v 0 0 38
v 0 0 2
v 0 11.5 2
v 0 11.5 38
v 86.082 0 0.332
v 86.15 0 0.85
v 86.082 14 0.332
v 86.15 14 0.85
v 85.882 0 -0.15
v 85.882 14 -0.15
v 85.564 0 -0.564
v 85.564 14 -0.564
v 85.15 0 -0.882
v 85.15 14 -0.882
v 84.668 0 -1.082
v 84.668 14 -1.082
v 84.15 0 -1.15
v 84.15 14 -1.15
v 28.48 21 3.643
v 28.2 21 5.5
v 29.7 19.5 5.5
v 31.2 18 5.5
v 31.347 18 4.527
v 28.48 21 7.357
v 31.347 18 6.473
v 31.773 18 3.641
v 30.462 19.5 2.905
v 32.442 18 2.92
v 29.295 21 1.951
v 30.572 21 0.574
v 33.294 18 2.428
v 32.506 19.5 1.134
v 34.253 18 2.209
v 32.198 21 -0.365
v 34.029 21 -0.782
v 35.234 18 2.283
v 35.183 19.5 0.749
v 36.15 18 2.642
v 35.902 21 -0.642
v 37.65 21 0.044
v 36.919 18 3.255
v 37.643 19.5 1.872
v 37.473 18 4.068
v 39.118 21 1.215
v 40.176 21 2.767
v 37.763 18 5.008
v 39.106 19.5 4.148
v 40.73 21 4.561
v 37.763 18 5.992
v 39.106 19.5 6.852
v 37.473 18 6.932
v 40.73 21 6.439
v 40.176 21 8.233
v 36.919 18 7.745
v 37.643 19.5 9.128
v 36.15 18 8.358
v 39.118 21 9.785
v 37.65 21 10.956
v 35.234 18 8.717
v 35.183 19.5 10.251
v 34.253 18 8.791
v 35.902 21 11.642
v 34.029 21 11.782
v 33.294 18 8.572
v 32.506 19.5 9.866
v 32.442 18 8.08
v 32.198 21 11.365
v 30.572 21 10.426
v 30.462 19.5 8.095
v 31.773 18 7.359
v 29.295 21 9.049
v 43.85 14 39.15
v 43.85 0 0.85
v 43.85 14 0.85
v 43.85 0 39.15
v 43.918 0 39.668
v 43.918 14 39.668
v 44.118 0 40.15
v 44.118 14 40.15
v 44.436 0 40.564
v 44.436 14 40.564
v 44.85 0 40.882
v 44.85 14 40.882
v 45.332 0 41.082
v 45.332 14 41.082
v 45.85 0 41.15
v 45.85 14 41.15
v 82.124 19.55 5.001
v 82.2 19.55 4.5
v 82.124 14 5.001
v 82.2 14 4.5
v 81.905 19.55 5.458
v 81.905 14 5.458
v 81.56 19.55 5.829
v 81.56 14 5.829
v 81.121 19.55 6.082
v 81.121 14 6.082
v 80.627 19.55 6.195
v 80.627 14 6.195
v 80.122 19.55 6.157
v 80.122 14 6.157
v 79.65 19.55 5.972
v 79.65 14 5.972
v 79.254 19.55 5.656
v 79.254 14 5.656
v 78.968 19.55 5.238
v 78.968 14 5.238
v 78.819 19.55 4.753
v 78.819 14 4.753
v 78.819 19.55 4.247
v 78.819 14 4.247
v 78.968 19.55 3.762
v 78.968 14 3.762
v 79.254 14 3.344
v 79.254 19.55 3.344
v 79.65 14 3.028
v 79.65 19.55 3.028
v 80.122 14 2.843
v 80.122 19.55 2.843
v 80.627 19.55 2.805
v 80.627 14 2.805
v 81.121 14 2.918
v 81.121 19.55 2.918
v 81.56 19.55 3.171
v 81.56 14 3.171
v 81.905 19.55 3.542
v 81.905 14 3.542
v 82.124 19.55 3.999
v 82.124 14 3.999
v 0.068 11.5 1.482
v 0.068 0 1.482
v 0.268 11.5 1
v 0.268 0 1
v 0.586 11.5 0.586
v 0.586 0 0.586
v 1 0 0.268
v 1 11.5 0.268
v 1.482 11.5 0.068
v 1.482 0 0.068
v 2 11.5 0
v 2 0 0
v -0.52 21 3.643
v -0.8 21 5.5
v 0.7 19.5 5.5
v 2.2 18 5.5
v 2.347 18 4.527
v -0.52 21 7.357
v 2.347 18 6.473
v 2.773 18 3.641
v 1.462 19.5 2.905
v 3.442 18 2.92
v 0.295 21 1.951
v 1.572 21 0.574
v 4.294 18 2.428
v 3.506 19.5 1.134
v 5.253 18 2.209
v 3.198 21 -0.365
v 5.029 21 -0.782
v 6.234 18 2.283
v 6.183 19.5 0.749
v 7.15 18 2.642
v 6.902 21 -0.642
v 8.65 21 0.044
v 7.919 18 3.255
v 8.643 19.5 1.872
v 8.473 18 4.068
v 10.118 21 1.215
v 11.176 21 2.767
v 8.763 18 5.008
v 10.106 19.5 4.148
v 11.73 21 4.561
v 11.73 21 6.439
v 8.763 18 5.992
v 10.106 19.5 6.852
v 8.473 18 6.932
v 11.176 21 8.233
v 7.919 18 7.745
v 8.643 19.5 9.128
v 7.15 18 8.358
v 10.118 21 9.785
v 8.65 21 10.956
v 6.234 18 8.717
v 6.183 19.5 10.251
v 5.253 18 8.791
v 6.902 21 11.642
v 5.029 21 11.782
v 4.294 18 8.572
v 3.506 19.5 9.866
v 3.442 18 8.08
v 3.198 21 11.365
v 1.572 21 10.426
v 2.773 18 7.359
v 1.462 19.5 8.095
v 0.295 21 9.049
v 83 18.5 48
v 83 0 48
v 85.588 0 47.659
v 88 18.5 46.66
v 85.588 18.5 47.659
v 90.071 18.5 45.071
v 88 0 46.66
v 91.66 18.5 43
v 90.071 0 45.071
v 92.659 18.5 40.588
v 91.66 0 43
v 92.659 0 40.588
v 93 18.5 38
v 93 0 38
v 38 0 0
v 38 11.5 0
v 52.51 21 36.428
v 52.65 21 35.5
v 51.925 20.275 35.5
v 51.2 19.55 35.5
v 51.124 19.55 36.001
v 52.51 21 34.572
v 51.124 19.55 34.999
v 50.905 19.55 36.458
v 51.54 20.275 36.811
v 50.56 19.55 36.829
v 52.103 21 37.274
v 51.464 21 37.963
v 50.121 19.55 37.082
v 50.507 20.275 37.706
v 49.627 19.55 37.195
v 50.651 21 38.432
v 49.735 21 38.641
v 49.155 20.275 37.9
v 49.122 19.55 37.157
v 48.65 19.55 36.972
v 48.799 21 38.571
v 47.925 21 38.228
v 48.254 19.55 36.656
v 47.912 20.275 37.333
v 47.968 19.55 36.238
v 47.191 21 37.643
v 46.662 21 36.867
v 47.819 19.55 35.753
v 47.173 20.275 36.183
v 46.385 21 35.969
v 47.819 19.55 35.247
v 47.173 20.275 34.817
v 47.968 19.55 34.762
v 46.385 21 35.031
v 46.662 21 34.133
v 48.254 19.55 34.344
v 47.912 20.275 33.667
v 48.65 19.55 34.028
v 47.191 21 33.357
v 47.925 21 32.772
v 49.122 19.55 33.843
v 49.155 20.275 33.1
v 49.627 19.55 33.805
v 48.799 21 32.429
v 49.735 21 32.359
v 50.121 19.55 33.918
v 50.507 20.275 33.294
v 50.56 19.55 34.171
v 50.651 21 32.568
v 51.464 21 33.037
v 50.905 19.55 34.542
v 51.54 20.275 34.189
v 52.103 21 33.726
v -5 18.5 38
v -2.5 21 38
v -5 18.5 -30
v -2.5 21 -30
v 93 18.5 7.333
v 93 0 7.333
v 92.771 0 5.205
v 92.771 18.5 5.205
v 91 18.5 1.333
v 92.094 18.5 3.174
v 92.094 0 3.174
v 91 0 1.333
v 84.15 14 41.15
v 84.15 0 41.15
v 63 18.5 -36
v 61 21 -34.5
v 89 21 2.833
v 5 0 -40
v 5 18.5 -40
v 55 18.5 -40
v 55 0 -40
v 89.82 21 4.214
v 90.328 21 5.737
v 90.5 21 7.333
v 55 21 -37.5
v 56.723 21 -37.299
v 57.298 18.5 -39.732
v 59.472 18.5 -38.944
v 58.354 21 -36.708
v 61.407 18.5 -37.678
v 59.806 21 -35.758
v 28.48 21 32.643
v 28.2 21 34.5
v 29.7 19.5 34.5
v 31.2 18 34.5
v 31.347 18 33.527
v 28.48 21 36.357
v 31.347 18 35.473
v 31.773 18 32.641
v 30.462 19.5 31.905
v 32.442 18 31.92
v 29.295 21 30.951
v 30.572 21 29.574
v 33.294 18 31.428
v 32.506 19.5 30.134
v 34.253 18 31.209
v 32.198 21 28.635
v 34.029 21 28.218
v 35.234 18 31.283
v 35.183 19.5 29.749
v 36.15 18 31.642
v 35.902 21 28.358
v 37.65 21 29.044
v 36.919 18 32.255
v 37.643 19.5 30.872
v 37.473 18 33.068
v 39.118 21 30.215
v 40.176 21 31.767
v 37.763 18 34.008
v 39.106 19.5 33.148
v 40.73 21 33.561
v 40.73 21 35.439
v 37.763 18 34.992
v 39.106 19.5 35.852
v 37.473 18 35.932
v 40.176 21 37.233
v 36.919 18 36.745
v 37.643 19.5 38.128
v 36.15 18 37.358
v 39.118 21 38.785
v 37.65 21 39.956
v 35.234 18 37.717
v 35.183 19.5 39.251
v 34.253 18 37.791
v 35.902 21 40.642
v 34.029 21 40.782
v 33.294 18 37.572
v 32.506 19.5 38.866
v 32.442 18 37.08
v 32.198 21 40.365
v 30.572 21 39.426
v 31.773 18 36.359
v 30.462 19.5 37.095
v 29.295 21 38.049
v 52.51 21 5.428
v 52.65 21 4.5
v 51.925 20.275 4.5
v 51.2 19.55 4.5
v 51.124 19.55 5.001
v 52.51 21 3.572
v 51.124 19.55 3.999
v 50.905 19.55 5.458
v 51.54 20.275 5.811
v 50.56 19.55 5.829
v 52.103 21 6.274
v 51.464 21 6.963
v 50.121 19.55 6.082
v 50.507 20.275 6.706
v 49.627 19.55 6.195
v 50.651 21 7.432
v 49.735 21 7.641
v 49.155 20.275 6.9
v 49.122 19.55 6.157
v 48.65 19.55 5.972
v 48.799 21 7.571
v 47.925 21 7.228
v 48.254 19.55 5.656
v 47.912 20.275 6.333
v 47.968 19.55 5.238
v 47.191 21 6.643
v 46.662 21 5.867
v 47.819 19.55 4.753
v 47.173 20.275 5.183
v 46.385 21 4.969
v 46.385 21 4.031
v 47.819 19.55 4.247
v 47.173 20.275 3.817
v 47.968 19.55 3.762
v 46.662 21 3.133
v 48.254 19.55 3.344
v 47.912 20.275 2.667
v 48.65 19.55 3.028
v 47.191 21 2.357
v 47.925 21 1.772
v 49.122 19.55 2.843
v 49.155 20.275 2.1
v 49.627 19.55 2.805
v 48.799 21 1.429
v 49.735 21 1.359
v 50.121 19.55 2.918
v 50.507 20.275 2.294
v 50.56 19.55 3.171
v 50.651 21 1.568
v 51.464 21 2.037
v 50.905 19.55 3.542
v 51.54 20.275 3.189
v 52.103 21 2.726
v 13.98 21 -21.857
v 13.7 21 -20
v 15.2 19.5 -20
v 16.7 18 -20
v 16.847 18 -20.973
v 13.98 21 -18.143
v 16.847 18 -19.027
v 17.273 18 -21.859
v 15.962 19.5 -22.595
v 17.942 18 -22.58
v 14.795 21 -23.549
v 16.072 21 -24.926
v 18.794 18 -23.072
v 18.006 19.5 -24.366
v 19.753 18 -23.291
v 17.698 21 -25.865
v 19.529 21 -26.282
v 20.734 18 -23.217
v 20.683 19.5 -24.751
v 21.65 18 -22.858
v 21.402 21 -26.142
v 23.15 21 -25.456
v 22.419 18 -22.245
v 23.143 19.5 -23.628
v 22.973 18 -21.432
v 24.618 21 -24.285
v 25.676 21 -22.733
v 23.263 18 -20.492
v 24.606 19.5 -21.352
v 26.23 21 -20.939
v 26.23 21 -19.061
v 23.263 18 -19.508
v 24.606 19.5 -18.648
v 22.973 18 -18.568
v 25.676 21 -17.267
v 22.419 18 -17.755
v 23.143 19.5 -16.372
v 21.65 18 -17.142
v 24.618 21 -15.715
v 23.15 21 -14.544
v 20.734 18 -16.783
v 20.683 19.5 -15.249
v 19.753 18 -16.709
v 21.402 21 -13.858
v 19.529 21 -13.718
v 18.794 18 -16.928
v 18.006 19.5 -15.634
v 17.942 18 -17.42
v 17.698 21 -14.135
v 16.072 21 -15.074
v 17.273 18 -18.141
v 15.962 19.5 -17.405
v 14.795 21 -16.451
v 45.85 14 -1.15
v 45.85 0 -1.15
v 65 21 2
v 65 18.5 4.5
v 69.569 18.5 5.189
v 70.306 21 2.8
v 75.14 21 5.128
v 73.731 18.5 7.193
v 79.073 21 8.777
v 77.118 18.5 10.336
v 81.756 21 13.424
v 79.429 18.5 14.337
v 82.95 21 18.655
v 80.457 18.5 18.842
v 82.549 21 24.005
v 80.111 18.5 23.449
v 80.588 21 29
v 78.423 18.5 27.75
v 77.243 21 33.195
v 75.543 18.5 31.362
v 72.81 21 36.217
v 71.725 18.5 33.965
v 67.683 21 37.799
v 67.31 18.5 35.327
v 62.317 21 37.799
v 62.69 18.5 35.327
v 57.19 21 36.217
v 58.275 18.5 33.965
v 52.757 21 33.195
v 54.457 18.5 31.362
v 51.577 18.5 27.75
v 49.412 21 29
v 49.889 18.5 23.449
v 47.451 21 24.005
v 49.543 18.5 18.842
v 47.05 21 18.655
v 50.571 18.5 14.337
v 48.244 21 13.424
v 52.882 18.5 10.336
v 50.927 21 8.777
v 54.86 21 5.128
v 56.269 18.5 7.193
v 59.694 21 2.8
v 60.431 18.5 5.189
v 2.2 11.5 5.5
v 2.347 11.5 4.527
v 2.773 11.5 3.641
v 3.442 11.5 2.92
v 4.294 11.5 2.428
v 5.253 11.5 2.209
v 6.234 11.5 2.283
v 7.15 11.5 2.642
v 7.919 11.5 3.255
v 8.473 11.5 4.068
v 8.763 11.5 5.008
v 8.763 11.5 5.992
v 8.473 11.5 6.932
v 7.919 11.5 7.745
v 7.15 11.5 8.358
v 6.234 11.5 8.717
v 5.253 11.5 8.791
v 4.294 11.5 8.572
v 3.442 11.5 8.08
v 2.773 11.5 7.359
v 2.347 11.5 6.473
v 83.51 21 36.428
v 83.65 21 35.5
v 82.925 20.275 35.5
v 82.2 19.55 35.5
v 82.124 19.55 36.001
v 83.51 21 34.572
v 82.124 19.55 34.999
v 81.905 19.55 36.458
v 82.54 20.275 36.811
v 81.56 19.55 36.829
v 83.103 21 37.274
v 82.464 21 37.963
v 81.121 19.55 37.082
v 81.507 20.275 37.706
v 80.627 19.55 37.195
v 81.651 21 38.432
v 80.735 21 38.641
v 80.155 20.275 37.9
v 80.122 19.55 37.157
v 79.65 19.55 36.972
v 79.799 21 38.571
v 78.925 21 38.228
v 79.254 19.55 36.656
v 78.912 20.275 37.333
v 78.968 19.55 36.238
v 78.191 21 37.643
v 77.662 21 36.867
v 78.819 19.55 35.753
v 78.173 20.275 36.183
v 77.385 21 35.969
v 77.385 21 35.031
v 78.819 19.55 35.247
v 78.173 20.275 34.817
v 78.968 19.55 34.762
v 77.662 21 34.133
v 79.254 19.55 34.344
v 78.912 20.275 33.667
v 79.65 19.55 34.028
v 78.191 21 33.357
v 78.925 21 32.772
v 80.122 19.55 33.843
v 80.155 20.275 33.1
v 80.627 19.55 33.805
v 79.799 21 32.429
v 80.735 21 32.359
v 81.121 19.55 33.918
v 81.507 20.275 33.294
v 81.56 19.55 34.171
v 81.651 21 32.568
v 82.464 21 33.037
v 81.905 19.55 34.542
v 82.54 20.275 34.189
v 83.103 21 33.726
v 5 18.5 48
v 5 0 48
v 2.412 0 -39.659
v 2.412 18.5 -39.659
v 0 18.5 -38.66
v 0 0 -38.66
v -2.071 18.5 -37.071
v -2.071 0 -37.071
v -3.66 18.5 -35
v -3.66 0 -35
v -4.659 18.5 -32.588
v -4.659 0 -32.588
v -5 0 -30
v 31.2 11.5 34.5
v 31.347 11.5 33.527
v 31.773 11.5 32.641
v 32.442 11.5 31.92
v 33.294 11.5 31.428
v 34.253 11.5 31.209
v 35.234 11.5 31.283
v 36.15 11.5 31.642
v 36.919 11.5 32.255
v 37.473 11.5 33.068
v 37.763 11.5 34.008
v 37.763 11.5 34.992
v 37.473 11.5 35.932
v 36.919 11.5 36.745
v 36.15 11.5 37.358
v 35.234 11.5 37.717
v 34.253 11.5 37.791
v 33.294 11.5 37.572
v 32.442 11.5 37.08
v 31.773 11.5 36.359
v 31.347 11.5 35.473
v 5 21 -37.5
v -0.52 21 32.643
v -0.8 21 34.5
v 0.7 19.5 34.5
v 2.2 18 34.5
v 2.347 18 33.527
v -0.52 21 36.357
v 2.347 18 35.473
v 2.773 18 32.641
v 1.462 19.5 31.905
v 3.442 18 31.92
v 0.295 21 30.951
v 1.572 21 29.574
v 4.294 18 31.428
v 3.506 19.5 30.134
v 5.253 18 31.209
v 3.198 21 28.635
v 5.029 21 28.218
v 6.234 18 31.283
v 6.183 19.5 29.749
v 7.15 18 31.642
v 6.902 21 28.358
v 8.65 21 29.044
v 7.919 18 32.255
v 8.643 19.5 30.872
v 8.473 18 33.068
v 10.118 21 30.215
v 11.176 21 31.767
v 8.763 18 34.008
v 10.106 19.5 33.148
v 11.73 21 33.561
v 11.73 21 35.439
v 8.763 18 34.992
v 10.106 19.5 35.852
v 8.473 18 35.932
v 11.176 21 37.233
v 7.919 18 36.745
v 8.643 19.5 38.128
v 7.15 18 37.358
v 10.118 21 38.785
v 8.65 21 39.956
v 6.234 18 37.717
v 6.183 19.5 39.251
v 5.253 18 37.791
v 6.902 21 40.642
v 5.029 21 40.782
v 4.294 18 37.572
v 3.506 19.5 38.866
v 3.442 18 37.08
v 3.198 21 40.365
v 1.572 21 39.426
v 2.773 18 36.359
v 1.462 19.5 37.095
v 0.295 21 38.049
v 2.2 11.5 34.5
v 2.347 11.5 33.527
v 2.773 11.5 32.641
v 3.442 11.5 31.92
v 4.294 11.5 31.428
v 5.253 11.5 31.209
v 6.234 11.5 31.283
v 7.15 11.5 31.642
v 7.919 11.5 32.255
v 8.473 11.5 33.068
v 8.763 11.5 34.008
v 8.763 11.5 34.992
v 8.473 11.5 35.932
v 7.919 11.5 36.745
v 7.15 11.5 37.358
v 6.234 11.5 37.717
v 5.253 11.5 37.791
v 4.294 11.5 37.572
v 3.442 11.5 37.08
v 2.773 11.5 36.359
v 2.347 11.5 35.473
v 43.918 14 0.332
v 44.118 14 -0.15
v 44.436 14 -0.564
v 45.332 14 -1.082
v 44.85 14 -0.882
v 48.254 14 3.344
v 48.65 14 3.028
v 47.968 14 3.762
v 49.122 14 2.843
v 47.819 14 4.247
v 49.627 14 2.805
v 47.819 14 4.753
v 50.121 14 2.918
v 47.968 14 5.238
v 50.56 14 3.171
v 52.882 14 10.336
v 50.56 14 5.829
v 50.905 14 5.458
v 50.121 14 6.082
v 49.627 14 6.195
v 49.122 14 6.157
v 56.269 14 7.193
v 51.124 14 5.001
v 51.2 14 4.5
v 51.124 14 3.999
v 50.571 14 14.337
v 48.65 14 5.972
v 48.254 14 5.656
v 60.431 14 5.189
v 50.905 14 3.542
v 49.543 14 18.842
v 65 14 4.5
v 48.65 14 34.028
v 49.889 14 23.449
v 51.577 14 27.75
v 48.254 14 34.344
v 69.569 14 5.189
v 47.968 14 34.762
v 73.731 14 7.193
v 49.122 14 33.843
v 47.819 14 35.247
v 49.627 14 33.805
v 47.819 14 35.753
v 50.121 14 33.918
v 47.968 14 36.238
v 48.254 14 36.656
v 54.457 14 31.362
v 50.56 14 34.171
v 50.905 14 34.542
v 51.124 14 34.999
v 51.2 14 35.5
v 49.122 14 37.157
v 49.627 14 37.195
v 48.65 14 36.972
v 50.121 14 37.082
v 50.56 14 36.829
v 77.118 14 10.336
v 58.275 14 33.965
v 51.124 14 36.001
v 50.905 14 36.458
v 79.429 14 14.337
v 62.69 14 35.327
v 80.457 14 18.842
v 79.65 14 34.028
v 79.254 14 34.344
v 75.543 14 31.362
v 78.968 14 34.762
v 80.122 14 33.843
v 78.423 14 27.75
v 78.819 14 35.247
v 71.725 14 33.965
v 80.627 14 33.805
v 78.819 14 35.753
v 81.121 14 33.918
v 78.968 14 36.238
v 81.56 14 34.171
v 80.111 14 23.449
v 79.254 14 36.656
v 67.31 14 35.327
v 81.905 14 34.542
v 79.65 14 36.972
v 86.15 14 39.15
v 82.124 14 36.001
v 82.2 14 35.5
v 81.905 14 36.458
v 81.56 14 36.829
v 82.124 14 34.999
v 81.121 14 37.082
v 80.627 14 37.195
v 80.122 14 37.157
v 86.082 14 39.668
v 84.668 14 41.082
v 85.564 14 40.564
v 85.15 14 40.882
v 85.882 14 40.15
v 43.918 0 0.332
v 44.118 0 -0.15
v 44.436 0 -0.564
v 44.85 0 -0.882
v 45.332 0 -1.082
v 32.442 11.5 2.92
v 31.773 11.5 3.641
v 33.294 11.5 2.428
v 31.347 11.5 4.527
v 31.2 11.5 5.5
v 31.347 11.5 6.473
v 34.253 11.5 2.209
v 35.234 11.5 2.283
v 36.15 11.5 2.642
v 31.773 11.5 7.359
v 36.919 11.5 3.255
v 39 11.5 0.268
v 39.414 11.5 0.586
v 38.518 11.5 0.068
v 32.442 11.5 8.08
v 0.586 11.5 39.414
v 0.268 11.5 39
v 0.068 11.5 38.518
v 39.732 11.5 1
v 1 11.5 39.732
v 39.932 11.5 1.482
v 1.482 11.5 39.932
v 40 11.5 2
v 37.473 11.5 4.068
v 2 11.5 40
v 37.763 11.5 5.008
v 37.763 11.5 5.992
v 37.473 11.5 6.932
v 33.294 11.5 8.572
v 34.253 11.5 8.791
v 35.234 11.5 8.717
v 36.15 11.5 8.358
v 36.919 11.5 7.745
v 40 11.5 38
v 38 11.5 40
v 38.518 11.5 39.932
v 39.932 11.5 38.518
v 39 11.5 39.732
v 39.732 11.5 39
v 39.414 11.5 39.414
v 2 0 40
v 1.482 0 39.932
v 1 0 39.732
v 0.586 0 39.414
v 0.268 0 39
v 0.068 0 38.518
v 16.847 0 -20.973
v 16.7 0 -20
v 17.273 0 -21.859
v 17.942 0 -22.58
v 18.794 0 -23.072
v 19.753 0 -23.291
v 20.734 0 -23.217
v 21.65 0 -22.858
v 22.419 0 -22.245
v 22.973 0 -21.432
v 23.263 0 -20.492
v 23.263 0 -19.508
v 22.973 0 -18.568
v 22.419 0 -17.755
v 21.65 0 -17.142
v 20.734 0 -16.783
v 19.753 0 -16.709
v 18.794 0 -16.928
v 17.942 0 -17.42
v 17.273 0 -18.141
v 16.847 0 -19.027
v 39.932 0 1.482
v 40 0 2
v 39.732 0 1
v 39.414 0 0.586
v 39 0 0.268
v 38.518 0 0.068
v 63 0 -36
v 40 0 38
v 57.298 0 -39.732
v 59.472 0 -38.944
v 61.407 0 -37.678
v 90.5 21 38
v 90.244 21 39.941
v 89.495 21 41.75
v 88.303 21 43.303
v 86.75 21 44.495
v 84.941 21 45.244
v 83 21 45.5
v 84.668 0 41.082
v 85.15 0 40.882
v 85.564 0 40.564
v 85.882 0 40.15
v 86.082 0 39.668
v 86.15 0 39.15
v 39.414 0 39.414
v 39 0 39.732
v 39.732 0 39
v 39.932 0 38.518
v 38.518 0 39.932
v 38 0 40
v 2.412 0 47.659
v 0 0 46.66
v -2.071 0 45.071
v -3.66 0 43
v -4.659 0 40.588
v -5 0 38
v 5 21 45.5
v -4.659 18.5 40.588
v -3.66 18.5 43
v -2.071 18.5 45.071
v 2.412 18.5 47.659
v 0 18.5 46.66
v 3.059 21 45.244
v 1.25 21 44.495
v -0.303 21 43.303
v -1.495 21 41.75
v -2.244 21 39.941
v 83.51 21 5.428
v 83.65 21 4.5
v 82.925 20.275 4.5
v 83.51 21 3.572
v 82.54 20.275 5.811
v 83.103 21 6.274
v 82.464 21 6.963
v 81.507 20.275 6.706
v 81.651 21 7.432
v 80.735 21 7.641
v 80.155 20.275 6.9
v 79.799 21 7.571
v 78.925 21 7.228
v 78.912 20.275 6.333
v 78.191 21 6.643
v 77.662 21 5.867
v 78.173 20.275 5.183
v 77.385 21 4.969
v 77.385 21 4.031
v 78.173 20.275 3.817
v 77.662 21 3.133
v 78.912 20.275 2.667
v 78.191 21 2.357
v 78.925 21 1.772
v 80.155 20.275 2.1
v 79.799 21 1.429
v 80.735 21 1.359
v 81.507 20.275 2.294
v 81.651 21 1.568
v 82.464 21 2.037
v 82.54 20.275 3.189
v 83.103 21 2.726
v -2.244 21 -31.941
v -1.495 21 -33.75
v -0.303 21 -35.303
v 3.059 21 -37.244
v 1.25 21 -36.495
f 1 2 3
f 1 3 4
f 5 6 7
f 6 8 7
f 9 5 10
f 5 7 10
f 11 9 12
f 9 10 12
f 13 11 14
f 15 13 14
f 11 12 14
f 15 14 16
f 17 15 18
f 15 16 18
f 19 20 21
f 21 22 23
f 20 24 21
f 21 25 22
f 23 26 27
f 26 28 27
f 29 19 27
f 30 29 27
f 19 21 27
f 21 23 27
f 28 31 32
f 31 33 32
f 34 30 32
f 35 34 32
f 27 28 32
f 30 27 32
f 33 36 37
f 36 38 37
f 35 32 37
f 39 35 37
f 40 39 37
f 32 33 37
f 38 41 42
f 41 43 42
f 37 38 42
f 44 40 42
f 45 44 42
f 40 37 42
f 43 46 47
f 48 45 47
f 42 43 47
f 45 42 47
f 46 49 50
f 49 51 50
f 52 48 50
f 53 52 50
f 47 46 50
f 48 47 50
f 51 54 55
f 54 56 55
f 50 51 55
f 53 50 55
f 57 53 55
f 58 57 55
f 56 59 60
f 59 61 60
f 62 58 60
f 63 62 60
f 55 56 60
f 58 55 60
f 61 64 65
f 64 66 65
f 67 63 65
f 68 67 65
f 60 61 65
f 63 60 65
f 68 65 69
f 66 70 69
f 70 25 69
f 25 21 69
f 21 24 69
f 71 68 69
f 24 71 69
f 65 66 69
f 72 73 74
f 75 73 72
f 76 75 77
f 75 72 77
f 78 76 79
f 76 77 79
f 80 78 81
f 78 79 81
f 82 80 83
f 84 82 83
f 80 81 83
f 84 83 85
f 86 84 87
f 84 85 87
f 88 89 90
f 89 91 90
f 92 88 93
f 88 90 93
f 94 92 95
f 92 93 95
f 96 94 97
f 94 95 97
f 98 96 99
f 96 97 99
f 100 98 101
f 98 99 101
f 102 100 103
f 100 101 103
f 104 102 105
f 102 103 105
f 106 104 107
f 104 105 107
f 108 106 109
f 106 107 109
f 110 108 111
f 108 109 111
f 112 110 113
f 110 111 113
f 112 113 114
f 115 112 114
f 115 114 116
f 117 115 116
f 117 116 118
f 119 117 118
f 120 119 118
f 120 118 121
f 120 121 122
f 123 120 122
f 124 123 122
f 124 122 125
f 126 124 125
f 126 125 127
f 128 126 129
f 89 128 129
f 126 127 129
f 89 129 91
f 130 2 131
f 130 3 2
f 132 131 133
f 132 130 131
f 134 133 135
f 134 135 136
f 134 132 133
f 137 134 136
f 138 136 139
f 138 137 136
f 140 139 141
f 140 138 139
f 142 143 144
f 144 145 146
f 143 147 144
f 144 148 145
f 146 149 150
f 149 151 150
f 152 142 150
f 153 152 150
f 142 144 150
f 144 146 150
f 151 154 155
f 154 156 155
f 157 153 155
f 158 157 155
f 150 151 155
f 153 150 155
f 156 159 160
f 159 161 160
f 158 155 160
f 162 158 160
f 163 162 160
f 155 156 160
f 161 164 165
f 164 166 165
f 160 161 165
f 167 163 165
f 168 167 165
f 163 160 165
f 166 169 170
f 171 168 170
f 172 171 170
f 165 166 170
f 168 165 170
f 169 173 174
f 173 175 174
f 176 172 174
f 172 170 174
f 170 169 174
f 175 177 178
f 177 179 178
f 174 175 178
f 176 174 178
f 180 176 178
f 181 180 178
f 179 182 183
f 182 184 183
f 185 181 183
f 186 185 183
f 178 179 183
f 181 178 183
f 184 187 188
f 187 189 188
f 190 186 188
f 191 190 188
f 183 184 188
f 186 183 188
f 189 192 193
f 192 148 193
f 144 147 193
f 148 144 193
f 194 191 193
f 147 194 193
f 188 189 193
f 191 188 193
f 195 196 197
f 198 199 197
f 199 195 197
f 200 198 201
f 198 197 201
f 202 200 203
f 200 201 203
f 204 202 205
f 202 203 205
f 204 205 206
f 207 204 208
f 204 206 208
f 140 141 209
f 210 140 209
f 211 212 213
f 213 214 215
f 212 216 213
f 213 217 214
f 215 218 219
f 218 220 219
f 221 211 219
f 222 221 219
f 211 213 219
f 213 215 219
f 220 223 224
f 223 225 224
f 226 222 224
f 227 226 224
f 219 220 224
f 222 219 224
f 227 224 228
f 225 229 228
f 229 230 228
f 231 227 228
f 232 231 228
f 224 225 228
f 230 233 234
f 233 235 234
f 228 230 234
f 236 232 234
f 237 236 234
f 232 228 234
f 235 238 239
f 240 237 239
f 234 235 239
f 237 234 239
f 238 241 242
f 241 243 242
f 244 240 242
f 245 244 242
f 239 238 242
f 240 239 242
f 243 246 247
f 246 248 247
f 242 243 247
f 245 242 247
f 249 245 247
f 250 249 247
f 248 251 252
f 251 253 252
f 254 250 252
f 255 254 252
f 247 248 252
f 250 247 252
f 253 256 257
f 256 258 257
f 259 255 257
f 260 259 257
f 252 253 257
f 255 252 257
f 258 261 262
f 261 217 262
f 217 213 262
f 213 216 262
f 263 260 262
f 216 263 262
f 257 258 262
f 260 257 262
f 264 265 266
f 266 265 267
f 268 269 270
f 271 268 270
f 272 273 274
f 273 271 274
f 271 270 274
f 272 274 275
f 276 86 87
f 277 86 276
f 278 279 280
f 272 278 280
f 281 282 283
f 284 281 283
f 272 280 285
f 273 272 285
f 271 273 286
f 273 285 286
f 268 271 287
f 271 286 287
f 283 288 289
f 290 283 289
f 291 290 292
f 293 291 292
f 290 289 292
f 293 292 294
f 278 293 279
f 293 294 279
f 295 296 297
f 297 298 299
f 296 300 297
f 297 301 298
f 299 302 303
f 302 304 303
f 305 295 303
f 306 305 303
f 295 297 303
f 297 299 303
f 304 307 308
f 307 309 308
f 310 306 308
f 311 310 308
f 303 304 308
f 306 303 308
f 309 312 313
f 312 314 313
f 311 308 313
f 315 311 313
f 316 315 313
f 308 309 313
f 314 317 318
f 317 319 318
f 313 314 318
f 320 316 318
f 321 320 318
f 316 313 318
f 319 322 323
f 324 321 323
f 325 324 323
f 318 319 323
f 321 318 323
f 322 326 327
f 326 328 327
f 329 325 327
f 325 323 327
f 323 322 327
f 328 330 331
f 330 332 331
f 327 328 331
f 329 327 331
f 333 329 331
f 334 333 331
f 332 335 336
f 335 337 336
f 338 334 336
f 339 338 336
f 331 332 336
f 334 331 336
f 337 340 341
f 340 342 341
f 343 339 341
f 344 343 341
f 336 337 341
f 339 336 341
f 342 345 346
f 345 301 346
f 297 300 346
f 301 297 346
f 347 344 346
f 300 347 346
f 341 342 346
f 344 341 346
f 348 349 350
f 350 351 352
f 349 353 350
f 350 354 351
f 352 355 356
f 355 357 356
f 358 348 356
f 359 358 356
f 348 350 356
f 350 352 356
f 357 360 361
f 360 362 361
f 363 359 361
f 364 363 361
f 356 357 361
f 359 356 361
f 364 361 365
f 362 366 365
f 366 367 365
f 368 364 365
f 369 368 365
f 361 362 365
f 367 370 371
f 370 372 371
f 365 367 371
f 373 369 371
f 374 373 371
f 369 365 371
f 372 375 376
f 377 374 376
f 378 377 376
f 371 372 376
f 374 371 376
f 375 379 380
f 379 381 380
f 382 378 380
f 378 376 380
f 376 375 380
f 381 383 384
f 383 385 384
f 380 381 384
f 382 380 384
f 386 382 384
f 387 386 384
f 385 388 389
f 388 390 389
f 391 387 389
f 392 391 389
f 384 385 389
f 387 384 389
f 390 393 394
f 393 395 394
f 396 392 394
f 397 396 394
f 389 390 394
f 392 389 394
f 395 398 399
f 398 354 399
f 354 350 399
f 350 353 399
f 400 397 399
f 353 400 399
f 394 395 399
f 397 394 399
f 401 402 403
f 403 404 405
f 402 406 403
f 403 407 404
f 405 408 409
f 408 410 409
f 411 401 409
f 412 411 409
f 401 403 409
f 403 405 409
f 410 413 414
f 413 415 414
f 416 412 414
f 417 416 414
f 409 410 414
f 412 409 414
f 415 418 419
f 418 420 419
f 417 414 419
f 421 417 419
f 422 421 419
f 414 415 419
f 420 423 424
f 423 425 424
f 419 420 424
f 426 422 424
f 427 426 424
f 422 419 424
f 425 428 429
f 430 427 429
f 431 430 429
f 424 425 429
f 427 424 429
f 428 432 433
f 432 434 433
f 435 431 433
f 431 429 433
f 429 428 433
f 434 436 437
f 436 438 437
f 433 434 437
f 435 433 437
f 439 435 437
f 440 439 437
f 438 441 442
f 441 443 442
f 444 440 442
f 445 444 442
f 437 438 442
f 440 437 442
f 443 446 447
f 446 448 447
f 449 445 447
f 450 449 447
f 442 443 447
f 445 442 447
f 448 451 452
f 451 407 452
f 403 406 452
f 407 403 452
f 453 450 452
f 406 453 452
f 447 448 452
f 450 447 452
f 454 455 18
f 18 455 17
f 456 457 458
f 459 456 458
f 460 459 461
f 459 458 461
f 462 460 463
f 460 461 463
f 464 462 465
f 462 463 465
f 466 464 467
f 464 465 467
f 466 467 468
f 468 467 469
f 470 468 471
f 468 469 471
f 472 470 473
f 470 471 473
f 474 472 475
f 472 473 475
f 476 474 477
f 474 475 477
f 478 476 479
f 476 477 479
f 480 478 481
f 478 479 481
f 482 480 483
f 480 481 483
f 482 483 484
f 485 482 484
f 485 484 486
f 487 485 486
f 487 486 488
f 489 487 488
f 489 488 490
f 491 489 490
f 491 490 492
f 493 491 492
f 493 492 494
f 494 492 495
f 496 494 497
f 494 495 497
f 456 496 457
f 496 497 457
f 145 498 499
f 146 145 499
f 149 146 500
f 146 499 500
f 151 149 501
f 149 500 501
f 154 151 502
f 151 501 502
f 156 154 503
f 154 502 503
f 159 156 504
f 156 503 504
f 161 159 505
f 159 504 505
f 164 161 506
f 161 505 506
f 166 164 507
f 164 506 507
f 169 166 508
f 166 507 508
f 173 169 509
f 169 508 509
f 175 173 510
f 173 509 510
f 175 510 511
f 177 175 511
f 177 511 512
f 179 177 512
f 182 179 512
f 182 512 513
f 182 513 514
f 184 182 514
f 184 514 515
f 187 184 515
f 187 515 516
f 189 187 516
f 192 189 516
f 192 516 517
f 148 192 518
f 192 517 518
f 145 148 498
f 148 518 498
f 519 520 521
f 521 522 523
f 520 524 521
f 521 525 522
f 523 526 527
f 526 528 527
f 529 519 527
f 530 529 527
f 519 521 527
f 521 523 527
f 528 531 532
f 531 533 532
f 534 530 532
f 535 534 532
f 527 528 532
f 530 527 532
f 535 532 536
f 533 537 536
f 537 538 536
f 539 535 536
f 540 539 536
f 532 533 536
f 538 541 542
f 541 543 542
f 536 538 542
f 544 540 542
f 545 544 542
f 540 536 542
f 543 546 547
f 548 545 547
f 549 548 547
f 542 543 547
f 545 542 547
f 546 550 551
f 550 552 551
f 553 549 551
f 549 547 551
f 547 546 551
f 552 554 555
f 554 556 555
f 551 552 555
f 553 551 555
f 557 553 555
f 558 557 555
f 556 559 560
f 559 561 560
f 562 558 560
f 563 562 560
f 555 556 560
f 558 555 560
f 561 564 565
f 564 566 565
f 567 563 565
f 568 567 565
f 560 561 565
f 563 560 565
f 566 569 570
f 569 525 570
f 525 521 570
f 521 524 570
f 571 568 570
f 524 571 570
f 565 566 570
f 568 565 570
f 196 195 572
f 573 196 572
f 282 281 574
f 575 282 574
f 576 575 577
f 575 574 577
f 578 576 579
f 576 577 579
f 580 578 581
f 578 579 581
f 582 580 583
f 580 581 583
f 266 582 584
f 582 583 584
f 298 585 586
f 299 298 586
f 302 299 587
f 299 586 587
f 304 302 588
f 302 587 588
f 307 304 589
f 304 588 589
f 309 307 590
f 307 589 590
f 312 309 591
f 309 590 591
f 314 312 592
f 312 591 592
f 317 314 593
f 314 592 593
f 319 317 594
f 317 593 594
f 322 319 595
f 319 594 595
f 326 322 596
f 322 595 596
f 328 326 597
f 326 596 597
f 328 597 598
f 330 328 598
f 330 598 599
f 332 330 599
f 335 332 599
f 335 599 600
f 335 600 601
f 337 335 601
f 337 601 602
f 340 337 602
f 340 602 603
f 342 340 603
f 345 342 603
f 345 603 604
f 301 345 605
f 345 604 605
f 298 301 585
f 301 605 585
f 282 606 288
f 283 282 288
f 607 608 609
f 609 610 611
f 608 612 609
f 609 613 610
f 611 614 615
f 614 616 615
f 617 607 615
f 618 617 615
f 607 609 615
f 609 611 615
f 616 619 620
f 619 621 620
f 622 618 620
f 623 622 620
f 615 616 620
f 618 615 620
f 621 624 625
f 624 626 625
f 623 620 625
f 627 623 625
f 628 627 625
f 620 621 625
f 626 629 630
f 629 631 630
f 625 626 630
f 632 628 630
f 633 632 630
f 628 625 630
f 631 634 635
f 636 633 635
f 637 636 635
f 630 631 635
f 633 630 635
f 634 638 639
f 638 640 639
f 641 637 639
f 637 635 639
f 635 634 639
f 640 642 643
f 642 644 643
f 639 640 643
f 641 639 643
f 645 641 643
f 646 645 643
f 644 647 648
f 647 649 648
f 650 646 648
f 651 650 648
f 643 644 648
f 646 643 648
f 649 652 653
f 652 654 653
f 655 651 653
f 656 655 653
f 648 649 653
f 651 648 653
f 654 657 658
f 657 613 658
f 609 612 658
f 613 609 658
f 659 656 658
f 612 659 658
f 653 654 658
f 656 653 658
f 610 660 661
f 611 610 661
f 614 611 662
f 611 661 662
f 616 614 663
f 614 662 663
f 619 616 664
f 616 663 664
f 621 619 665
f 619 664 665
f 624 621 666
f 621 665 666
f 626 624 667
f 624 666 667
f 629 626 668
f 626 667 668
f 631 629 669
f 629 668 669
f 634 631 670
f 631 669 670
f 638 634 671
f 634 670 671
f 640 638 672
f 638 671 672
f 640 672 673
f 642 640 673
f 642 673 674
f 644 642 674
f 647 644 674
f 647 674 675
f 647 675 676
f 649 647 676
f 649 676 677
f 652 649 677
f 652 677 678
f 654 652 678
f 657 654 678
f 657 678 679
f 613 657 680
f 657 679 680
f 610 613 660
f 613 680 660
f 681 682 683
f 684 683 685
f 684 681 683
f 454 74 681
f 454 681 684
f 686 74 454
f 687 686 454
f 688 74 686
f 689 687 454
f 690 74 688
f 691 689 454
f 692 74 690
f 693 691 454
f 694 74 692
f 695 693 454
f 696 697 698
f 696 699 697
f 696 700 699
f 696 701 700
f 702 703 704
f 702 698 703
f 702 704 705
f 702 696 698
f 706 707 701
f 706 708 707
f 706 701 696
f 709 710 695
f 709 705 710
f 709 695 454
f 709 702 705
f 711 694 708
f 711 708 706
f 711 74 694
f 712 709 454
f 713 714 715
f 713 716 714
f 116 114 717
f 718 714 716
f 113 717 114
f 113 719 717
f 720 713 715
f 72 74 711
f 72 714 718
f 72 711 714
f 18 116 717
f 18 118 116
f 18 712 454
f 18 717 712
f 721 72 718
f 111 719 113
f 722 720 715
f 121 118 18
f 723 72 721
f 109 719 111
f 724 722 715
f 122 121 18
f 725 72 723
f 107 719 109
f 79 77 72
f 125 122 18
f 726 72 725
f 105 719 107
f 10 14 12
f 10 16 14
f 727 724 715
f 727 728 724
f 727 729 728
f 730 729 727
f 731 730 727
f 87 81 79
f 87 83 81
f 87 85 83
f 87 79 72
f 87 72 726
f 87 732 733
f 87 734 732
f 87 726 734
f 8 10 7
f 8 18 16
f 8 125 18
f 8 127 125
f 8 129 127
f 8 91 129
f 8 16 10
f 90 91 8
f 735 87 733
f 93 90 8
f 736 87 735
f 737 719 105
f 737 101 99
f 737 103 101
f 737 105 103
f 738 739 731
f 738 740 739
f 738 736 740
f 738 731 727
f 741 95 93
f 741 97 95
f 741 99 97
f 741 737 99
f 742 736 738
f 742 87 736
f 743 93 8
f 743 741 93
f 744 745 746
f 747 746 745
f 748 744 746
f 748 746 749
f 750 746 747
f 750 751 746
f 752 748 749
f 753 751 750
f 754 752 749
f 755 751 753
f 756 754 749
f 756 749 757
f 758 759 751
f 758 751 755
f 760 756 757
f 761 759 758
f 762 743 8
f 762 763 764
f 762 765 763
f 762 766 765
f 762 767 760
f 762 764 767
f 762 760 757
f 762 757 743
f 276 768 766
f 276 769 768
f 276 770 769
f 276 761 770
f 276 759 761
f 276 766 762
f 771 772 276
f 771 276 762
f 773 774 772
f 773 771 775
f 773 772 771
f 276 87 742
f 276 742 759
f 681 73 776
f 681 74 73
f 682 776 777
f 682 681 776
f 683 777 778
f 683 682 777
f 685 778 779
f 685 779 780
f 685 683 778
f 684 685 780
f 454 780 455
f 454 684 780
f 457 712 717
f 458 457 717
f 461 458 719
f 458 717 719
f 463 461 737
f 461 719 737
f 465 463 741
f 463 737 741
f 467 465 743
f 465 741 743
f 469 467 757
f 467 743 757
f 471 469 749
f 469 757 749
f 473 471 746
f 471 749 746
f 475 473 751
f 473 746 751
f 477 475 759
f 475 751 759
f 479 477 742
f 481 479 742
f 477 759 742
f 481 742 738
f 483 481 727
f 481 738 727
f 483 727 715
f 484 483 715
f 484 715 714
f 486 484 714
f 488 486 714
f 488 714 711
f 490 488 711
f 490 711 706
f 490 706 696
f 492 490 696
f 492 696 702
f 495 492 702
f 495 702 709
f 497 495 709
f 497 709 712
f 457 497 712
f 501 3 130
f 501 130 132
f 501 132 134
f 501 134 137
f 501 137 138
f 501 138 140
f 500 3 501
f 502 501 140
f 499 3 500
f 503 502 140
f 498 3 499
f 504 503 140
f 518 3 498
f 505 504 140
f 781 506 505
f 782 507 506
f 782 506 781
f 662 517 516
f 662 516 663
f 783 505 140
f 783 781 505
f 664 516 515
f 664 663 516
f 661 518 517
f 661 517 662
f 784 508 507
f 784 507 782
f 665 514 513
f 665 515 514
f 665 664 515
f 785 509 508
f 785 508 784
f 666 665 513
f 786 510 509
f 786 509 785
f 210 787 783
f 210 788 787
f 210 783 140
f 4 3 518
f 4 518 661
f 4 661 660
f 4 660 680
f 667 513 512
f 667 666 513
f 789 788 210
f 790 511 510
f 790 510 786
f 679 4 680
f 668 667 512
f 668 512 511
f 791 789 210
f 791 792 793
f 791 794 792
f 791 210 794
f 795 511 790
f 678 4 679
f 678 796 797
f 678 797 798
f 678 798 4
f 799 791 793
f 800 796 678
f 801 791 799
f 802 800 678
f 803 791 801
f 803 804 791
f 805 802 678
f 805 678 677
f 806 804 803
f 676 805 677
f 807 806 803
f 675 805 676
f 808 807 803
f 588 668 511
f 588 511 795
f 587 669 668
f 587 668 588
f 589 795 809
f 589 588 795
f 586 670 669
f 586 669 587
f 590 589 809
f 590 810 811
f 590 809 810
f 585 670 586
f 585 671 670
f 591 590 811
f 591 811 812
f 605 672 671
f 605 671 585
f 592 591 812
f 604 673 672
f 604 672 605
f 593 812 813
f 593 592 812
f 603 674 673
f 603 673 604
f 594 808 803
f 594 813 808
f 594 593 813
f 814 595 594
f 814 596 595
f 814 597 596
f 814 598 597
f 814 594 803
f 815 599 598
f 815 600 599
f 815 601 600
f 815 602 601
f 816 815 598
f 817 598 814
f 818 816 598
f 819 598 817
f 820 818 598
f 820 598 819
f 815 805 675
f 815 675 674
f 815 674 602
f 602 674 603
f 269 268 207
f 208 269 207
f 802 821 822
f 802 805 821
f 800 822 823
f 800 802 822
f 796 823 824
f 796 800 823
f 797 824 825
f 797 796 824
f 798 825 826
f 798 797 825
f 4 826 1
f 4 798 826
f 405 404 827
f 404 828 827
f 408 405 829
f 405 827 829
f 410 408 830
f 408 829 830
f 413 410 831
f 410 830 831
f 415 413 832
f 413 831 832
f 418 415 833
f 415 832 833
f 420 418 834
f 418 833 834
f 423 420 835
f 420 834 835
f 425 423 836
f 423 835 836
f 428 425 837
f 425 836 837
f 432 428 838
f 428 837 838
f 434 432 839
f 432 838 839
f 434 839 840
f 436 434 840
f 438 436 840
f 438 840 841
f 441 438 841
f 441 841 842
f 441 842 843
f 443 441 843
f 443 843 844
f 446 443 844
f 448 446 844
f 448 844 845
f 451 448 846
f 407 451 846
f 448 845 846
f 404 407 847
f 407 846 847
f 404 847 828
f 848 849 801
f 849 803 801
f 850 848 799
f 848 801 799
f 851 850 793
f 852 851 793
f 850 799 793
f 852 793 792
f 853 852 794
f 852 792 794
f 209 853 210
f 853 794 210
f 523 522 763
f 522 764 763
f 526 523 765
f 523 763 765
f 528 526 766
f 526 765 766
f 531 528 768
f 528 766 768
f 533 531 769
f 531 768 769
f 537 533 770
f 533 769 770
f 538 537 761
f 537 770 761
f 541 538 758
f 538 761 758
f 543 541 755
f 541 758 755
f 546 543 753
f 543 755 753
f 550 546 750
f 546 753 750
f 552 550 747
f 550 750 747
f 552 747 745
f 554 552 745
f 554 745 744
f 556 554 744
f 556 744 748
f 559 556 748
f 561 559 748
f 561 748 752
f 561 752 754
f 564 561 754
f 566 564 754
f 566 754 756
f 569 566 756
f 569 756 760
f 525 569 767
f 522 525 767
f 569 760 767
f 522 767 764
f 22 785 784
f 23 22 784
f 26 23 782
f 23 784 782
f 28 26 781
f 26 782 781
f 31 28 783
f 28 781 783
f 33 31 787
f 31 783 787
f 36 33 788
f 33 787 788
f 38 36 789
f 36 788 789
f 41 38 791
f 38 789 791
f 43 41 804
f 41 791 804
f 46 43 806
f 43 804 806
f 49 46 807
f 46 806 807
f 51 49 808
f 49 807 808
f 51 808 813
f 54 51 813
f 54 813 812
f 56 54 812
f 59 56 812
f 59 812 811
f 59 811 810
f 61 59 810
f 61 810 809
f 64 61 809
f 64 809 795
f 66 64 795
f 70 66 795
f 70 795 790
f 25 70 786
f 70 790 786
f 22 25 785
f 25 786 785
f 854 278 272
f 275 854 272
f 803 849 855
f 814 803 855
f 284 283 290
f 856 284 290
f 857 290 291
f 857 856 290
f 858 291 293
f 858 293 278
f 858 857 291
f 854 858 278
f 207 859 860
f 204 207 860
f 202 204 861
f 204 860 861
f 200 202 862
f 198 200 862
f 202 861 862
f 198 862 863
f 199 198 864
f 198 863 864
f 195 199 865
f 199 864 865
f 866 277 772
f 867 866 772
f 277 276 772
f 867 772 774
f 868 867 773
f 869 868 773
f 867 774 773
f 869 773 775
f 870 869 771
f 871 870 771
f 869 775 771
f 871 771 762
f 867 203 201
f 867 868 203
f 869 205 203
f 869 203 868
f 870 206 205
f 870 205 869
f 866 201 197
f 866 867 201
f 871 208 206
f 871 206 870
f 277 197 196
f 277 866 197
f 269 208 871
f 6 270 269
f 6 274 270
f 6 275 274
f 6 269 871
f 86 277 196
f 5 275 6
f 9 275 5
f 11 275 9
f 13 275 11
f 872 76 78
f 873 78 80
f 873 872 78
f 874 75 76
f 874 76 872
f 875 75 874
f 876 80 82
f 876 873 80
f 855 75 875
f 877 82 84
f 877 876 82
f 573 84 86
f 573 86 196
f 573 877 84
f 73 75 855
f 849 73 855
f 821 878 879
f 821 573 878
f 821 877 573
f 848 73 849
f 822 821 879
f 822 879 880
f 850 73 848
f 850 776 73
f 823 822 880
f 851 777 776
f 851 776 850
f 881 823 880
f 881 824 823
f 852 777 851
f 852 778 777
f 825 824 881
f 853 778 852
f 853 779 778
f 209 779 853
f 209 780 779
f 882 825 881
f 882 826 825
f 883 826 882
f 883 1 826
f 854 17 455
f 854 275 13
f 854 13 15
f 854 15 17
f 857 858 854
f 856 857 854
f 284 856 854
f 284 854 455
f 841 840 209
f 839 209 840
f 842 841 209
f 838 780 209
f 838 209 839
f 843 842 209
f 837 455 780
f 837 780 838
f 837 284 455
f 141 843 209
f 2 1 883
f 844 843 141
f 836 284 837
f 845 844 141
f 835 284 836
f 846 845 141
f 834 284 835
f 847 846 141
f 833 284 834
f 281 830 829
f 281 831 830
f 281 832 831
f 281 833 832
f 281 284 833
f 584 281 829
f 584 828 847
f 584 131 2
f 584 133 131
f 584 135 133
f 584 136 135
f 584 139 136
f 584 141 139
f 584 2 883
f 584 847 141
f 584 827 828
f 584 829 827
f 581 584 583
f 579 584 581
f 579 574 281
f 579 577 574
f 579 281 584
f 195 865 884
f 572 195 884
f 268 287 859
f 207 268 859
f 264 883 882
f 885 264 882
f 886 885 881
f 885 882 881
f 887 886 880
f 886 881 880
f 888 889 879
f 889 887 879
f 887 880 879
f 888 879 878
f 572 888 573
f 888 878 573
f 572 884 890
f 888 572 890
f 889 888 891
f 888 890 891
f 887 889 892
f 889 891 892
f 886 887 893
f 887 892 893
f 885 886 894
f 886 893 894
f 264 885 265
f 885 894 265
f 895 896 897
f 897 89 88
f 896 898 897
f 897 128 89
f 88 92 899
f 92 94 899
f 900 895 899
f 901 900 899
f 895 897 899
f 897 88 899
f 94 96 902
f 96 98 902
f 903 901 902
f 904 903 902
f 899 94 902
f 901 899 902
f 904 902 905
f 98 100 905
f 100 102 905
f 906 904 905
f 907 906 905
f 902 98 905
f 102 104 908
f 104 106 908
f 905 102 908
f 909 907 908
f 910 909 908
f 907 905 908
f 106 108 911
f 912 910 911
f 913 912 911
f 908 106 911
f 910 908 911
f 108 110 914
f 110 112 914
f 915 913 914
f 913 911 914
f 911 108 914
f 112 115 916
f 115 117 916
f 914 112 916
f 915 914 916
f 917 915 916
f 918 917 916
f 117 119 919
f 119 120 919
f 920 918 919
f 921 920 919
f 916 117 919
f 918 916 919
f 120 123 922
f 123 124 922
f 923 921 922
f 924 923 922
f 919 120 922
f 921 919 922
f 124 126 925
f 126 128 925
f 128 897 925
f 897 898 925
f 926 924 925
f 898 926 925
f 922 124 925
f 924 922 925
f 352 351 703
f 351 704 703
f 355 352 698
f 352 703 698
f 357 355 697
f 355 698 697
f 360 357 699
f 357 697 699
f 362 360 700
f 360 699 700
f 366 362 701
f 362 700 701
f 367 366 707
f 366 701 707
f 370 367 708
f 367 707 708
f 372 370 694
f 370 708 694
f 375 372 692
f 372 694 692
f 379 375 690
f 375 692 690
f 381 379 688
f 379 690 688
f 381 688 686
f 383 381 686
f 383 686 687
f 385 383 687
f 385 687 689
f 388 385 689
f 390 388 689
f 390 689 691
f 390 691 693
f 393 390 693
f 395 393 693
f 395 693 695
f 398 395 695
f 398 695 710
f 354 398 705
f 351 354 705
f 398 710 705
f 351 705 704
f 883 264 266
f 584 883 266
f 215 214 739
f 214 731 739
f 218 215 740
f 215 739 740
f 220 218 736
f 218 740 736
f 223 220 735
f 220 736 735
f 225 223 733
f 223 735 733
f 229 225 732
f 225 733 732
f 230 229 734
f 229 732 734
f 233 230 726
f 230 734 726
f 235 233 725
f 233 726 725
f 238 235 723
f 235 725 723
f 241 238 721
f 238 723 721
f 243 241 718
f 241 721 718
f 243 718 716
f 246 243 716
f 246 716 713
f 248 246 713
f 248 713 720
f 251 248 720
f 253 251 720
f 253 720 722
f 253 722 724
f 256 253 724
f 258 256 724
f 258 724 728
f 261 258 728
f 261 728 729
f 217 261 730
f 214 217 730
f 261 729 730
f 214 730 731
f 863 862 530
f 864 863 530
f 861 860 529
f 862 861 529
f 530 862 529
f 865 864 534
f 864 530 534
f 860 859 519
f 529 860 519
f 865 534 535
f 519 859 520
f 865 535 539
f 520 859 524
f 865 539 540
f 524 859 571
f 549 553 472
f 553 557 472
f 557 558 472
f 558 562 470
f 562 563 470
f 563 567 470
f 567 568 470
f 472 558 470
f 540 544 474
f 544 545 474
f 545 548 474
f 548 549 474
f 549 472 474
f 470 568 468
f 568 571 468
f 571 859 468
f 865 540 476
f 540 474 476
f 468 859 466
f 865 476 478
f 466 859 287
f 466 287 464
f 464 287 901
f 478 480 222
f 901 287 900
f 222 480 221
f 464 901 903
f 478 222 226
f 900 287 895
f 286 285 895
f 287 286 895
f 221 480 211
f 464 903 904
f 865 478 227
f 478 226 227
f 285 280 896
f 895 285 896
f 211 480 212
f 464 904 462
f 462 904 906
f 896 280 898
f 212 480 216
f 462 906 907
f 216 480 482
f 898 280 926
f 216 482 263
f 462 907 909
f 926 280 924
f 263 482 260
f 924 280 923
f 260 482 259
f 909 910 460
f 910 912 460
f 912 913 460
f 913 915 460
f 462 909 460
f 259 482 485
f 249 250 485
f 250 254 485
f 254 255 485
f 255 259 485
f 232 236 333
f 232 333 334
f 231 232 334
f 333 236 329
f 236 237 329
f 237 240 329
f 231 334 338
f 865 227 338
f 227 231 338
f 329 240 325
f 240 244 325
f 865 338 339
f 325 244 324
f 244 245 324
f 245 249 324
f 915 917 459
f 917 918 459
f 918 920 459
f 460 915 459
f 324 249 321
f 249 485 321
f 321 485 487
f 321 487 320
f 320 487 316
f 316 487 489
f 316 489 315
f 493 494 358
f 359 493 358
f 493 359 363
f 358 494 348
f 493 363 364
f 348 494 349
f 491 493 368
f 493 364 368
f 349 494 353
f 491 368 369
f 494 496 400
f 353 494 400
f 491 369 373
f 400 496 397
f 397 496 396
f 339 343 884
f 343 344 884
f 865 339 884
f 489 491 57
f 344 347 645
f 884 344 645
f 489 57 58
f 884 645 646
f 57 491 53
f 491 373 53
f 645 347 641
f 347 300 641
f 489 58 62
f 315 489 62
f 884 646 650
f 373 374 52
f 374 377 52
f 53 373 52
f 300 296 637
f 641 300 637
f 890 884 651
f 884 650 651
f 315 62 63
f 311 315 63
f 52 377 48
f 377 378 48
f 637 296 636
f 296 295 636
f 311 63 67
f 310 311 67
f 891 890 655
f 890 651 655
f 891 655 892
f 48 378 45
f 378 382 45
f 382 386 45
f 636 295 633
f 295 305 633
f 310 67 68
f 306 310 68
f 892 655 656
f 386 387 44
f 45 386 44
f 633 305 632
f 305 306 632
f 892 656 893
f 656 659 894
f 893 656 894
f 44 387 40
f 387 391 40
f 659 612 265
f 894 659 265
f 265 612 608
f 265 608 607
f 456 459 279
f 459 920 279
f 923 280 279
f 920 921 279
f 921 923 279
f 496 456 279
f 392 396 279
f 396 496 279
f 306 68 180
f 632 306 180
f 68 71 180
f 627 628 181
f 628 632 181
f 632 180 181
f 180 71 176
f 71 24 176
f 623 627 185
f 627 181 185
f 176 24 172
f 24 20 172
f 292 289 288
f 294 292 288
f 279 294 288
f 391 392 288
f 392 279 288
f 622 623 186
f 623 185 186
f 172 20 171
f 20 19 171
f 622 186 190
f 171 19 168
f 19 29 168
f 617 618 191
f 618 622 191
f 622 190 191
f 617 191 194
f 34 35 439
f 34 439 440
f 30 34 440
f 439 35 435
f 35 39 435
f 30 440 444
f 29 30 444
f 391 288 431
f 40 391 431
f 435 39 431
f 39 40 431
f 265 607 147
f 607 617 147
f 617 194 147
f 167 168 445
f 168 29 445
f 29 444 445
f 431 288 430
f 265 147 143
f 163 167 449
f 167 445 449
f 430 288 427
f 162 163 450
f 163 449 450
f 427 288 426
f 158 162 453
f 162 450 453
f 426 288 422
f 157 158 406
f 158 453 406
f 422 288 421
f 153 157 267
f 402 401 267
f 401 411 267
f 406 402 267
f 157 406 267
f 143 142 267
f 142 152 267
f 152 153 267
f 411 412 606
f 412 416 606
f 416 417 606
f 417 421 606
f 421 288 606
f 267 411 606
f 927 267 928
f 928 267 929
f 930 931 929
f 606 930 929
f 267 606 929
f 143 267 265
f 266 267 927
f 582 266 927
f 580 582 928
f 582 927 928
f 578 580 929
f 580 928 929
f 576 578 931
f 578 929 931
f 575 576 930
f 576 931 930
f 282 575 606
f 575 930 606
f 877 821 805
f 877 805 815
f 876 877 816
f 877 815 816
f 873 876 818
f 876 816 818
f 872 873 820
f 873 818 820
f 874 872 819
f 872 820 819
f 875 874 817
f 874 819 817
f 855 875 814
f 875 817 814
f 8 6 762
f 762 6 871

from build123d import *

# Parameters (mm, degrees)
SKETCH_1_W                 = 80
SKETCH_1_H                 = 80
EXTRUDE_278_DEPTH          = 21
EXTRUDE_2_DEPTH            = 21
HOLE_WIZARD_M6_D           = 6.6
HOLE_WIZARD_M6_CSINK_D     = 12.6
HOLE_WIZARD_M6_CSINK_ANGLE = 90
SKETCH_10_W                = 40
SKETCH_10_H                = 40
CUT_EXTRUDE_40_DEPTH       = 11.5
SKETCH_11_W                = 42.3
SKETCH_11_H                = 42.3
NEMA17_DEPTH               = 14
NEMA17_M3_D                = 3.4
NEMA17_M3_CSINK_D          = 6.3
NEMA17_M3_CSINK_ANGLE      = 90
FILLET_1_R                 = 2
SKETCH_14_R                = 15.5
NEMA23_DEPTH               = 106.588825166
SKETCH_2_W                 = 35
SKETCH_2_H                 = 88
CUT_EXTRUDE_4267_DEPTH     = 107.742681248
CUT_EXTRUDE_1_DEPTH        = 107.742681248
FILLET_2_R                 = 10
CHAMFER_1_SIZE             = 2.5


with BuildPart() as part:
    # Эскиз1 → Extrude 278 (new body)
    with BuildSketch(Plane(origin=(0, 0, 0), x_dir=(1, 0, 0), z_dir=(0, 1, 0))):
        Rectangle(SKETCH_1_W, SKETCH_1_H)
    extrude(amount=EXTRUDE_278_DEPTH)

    # Эскиз9 → База-2 (add)
    with BuildSketch(Plane(origin=(0, 21, 0), x_dir=(1, 0, 0), z_dir=(0, 1, 0))):
        Polygon((40, 40), (93, 40), (93, -48), (-40, -48), (-40, -40), (40, -40), align=None)
    extrude(amount=-EXTRUDE_2_DEPTH)

    # Крепление-M6 (through all)
    with Locations(Plane(origin=(0, 21, 0), x_dir=(1, 0, 0), z_dir=(0, 1, 0))):
        with Locations((-20, -20), (20, 20), (5.5, -5.5), (34.5, -5.5), (34.5, -34.5), (5.5, -34.5)):
            CounterSinkHole(HOLE_WIZARD_M6_D / 2, HOLE_WIZARD_M6_CSINK_D / 2, counter_sink_angle=HOLE_WIZARD_M6_CSINK_ANGLE)

    # Эскиз10 → Профиль-40 (cut)
    with BuildSketch(Plane.XZ):
        with Locations((20, 20)):
            Rectangle(SKETCH_10_W, SKETCH_10_H)
    extrude(amount=-CUT_EXTRUDE_40_DEPTH, mode=Mode.SUBTRACT)

    # Эскиз11 → Nema17 (cut)
    with BuildSketch(Plane.XZ):
        with Locations((65, 20)):
            Rectangle(SKETCH_11_W, SKETCH_11_H)
    extrude(amount=-NEMA17_DEPTH, mode=Mode.SUBTRACT)

    # Nema17-M3 (through all)
    with Locations(Plane(origin=(0, 21, 0), x_dir=(-1, 0, 0), z_dir=(0, 1, 0))):
        with Locations((-49.5, 35.5), (-80.5, 35.5), (-80.5, 4.5), (-49.5, 4.5)):
            CounterSinkHole(NEMA17_M3_D / 2, NEMA17_M3_CSINK_D / 2, counter_sink_angle=NEMA17_M3_CSINK_ANGLE)

    # Скругление1
    fillet_1_edges = [part.edges().sort_by_distance(p)[0] for p in [
        (0, 5.75, 0),
        (0, 5.75, 40),
        (40, 5.75, 40),
        (40, 5.75, 0),
        (86.15, 7, 41.15),
        (86.15, 7, -1.15),
        (43.85, 7, -1.15),
        (43.85, 7, 41.15),
    ]]
    fillet(fillet_1_edges, radius=FILLET_1_R)

    # Эскиз14 → Вырез-Nema23 (cut, through all)
    with BuildSketch(Plane.XZ.offset(-14)):
        with Locations(Location((65, 20, 0), (0, 0, 270))):
            Circle(SKETCH_14_R)
    extrude(amount=-NEMA23_DEPTH, mode=Mode.SUBTRACT)

    # Эскиз2 → Cut-Extrude 4267 (cut, through all)
    with BuildSketch(Plane(origin=(0, 21, 0), x_dir=(1, 0, 0), z_dir=(0, 1, 0))):
        with Locations((-22.5, -4)):
            Rectangle(SKETCH_2_W, SKETCH_2_H)
    extrude(amount=-CUT_EXTRUDE_4267_DEPTH, mode=Mode.SUBTRACT)

    # Эскиз15 → Вырез-Вытянуть1 (cut, through all)
    with BuildSketch(Plane(origin=(0, 21, 0), x_dir=(1, 0, 0), z_dir=(0, 1, 0))):
        Polygon((60, 40), (93, -4), (93, 40), align=None)
    extrude(amount=-CUT_EXTRUDE_1_DEPTH, mode=Mode.SUBTRACT)

    # Скругление2
    fillet_2_edges = [part.edges().sort_by_distance(p)[0] for p in [
        (93, 10.5, 48),
        (-5, 10.5, -40),
        (-5, 10.5, 48),
        (60, 10.5, -40),
        (93, 10.5, 4),
    ]]
    fillet(fillet_2_edges, radius=FILLET_2_R)

    # Фаска1
    chamfer_1_edges = [part.edges().sort_by_distance(p)[0] for p in [
        (65, 21, 35.5),
        (93, 21, 22.666666667),
        (77, 21, -17.333333333),
        (30, 21, -40),
        (-5, 21, 4),
        (44, 21, 48),
        (-2.071067812, 21, 45.071067812),
        (90.071067812, 21, 45.071067812),
        (-2.071067812, 21, -37.071067812),
        (59.472135955, 21, -38.94427191),
        (92.486832981, 21, 4.171055673),
    ]]
    chamfer(chamfer_1_edges, length=CHAMFER_1_SIZE)


solid = part.part
